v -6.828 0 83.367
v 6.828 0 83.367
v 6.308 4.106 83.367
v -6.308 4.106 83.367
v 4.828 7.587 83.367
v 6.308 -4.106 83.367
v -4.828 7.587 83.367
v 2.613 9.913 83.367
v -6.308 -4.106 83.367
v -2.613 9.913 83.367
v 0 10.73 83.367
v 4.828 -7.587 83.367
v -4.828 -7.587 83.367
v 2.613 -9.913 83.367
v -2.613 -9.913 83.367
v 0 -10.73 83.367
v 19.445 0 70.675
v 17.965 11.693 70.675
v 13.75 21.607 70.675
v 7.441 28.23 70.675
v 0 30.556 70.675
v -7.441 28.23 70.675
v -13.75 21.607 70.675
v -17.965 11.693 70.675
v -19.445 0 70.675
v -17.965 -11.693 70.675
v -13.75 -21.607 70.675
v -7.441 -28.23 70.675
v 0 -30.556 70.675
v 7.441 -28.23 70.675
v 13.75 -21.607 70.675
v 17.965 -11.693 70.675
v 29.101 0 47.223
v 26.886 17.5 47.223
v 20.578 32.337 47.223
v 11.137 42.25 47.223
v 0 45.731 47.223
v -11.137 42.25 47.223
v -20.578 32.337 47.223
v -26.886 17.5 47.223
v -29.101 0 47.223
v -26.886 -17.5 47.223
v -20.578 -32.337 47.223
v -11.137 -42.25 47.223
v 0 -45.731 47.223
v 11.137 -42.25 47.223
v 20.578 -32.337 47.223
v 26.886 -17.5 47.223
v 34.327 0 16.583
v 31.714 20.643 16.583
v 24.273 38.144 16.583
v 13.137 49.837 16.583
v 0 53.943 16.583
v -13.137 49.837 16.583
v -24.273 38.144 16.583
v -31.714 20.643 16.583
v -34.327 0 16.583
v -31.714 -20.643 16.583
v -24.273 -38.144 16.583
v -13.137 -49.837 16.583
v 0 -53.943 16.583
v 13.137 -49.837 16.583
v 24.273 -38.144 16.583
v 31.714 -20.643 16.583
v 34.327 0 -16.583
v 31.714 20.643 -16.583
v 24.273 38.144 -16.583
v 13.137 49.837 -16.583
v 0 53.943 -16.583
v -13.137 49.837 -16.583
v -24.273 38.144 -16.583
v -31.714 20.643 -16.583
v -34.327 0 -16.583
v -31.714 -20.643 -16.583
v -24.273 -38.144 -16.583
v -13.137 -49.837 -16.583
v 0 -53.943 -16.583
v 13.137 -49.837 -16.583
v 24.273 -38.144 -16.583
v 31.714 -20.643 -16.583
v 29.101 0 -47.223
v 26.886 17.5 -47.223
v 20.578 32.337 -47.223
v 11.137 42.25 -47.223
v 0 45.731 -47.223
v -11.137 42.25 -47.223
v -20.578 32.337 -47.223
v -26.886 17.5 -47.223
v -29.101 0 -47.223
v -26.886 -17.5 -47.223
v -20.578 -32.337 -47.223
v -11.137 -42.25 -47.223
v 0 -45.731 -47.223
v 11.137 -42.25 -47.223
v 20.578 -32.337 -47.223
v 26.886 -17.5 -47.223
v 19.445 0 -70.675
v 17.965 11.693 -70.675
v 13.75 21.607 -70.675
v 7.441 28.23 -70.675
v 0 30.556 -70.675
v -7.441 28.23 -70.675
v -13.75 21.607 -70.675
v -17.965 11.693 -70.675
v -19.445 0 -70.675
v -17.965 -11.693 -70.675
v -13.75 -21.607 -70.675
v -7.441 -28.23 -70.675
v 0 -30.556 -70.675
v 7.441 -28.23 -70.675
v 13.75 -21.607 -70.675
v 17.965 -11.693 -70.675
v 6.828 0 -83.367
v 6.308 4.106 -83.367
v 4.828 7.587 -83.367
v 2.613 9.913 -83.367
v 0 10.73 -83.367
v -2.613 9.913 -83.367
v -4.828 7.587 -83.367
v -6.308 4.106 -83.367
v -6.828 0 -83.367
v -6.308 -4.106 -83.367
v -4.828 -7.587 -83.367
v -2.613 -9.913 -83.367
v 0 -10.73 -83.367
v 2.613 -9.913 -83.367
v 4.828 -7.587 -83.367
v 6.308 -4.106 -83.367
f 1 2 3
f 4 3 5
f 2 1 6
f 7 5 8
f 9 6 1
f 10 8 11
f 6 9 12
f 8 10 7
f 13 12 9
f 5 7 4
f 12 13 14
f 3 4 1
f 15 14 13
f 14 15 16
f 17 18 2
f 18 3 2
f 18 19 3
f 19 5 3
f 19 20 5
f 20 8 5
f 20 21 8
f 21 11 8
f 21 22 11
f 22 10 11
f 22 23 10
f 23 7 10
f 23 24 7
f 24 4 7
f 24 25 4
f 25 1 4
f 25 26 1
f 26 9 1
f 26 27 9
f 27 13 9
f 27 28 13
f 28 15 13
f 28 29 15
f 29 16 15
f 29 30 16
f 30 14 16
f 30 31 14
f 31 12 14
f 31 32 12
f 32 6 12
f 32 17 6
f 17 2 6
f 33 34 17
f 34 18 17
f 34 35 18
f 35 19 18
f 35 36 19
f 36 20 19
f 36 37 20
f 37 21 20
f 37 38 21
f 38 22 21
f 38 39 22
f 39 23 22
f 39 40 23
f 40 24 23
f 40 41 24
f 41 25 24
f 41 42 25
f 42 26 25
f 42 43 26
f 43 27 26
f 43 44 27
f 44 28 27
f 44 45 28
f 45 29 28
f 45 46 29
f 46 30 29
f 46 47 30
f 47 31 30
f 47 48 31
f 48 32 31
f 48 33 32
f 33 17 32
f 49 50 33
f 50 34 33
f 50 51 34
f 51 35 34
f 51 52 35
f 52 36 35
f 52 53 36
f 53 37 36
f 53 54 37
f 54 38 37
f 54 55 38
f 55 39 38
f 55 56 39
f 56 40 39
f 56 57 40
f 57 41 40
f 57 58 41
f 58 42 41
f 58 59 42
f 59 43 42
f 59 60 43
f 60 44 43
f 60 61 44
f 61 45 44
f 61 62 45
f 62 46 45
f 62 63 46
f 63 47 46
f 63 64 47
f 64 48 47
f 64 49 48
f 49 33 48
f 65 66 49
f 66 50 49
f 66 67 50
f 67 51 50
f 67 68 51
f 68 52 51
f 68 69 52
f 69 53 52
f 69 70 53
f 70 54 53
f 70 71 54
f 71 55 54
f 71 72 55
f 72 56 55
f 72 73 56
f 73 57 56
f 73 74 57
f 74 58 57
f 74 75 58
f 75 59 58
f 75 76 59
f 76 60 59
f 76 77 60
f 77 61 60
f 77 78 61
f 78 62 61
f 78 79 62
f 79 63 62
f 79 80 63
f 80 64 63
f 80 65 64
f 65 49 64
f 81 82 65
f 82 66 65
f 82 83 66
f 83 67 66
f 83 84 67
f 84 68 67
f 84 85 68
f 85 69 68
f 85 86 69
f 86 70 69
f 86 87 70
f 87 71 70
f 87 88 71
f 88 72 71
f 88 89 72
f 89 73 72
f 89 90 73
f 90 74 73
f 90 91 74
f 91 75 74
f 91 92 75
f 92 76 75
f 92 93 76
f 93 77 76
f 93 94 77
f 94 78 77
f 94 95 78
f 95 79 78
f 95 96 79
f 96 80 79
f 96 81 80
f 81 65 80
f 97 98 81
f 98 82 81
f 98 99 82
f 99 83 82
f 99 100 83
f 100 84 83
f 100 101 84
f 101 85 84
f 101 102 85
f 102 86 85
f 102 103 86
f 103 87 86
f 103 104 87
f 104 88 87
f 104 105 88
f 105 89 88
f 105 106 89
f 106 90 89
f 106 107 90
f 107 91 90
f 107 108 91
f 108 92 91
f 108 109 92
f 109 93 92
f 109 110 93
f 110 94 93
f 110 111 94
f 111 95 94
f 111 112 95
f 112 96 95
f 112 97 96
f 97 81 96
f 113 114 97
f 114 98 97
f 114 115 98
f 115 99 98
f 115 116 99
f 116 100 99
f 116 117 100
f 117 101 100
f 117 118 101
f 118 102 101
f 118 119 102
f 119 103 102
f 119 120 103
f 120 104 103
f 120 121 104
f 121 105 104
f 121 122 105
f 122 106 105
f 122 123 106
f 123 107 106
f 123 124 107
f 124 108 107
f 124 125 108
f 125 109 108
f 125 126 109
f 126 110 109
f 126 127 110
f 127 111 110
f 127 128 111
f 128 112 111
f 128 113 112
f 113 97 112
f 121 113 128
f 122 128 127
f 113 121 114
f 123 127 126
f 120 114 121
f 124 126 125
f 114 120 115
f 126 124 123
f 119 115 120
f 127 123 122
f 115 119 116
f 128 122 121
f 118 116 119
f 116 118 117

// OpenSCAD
// Generated by SolidPython 1.0.1 on 2020-07-29 00:46:47


scale(v = [7, 11, 17]) {
	sphere(r = 5);
}
/***********************************************
*********      SolidPython code:      **********
************************************************
 
# import packages: SolidPython
from solid import *
from solid.utils import *
from itertools import chain, combinations, permutations


class Resize:

    def __init__(self, scad_file):
        self.scad_file = scad_file
        #self.scad_file = import_scad(scad_file)
        # cone/cylinder param:
        self.r1 = 0
        self.r2 = 0
        self.h = 0
        # rectangular prism param:
        self.w = 0
        self.l = 0
        # ellipse param:
        self.r = 0

    # import OpenScad code (file name corresponds to shape)


    # classify shape + parameters
    def assign(self, param1, param2, param3):
        if self.scad_file == 'cone.scad':
            self.r1 = param1
            self.r2 = param2
            self.h = param3
        elif self.scad_file == 'cylinder.scad':
            self.r1 = param1
            self.r2 = param2
            self.h = param3
        elif self.scad_file == 'rectangularPrism.scad':
            self.h = param1
            self.l = param2
            self.w = param3
        else:
            self.r = param1
            self.h = param2

    # resize parameters
    def iterate(self):
        x = range(3, 20, 2)
        i = 1
        if self.scad_file == 'cone.scad':
            tempList = list(permutations(x, 2))
            for temp in tempList:
                param1 = temp[0]
                param2 = temp[1]
                filepath = 'produced_scad_files/' + 'cone' + str(param1) + '_' + str(param2) + '_' + '.scad'
                scad_render_to_file(cylinder(h=param1, r1=param2, r2=0), filepath)

        elif self.scad_file == 'cylinder.scad':
            tempList = list(permutations(x, 3))
            for temp in tempList:
                param1 = temp[0]
                param2 = temp[1]
                filepath = 'produced_scad_files/' + 'cylinder' + str(param1) + '_' + str(param2) + '_' + '.scad'
                scad_render_to_file(cylinder(h=param1, r1=param2, r2=param2), filepath)

        elif self.scad_file == 'rectangularPrism.scad':
            tempList = list(permutations(x, 3))
            for temp in tempList:
                param1 = temp[0]
                param2 = temp[1]
                param3 = temp[2]
                filepath = 'produced_scad_files/' + 'rectangularPrism' + str(param1) + '_' + str(param2) + '_' + str(
                    param3) + '.scad'
                scad_render_to_file(cube(size=(param1, param2, param3)), filepath)

        elif self.scad_file == 'ellipse.scad':
            tempList = list(permutations(x, 4))
            for temp in tempList:
                param1 = temp[0]
                param2 = temp[1]
                param3 = temp[2]
                param4 = temp[3]
                filepath = 'produced_scad_files/' + 'ellipse' + str(param1) + '_' + str(param2) + '_' + str(param3) + '_' + str(param4) + '.scad'
                scad_render_to_file(scale([param1, param2, param3])(sphere(r=param4)), filepath)

    def render_to_scadfile(self):
        scad_render_to_file(scad, 'example.scad') 
 
************************************************/
